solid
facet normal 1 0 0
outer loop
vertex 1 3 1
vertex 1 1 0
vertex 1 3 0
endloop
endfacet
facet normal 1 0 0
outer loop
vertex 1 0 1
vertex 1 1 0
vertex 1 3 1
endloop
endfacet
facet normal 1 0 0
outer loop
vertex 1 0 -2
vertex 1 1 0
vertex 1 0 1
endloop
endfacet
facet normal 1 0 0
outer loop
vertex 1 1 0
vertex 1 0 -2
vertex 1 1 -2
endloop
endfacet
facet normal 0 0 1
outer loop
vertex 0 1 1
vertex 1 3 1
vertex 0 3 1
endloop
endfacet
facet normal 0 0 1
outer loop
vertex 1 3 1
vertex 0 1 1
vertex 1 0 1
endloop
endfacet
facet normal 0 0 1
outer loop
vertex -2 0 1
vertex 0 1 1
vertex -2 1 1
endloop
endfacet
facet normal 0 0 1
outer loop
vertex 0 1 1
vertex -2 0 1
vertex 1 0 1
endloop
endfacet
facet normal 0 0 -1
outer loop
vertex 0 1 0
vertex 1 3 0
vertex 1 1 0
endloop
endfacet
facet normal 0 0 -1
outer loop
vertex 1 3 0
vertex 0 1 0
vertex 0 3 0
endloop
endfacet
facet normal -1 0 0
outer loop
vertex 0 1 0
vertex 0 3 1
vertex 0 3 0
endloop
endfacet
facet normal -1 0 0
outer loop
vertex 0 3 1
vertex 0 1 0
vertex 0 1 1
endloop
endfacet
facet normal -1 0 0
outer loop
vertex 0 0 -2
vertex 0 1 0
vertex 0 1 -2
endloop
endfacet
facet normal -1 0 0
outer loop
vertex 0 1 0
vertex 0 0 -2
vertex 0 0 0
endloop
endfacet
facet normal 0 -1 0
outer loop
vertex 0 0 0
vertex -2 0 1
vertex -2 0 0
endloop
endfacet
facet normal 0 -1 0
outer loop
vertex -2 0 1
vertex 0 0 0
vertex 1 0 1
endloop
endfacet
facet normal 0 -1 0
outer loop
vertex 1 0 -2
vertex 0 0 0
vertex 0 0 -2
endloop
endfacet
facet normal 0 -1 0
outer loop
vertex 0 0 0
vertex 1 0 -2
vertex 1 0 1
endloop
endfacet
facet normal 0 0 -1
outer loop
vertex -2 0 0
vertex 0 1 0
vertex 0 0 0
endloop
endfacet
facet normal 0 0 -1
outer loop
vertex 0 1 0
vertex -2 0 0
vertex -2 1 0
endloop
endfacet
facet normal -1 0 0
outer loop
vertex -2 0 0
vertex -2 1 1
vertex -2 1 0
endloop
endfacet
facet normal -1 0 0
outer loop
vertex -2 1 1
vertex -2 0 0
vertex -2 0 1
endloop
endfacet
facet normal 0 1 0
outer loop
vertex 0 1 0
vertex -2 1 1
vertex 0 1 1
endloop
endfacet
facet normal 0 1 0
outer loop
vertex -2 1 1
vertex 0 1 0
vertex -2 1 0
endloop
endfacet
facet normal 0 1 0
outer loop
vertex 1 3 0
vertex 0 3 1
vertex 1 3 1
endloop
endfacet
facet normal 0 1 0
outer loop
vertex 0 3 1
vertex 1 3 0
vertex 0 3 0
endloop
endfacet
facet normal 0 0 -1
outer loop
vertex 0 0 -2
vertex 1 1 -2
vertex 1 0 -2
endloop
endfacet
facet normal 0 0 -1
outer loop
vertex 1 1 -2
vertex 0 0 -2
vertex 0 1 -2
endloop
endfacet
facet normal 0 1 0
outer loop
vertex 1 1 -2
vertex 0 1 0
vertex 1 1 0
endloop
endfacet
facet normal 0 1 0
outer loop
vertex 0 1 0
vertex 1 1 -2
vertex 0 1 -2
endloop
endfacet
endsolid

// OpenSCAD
/**
Model coded by Alejandro Baranek
With licence cc-by-sa 4.0

https://creativecommons.org/licenses/by-sa/4.0/
*/
union() {
cube(1,1,1);    
color("blue")translate([-2,0,0])cube(size = [2,1,1]);
color("red")translate([0,1,0])cube(size = [1,2,1]);
color("yellow")translate([0,0,-2])cube(size = [1,1,2]);
}
